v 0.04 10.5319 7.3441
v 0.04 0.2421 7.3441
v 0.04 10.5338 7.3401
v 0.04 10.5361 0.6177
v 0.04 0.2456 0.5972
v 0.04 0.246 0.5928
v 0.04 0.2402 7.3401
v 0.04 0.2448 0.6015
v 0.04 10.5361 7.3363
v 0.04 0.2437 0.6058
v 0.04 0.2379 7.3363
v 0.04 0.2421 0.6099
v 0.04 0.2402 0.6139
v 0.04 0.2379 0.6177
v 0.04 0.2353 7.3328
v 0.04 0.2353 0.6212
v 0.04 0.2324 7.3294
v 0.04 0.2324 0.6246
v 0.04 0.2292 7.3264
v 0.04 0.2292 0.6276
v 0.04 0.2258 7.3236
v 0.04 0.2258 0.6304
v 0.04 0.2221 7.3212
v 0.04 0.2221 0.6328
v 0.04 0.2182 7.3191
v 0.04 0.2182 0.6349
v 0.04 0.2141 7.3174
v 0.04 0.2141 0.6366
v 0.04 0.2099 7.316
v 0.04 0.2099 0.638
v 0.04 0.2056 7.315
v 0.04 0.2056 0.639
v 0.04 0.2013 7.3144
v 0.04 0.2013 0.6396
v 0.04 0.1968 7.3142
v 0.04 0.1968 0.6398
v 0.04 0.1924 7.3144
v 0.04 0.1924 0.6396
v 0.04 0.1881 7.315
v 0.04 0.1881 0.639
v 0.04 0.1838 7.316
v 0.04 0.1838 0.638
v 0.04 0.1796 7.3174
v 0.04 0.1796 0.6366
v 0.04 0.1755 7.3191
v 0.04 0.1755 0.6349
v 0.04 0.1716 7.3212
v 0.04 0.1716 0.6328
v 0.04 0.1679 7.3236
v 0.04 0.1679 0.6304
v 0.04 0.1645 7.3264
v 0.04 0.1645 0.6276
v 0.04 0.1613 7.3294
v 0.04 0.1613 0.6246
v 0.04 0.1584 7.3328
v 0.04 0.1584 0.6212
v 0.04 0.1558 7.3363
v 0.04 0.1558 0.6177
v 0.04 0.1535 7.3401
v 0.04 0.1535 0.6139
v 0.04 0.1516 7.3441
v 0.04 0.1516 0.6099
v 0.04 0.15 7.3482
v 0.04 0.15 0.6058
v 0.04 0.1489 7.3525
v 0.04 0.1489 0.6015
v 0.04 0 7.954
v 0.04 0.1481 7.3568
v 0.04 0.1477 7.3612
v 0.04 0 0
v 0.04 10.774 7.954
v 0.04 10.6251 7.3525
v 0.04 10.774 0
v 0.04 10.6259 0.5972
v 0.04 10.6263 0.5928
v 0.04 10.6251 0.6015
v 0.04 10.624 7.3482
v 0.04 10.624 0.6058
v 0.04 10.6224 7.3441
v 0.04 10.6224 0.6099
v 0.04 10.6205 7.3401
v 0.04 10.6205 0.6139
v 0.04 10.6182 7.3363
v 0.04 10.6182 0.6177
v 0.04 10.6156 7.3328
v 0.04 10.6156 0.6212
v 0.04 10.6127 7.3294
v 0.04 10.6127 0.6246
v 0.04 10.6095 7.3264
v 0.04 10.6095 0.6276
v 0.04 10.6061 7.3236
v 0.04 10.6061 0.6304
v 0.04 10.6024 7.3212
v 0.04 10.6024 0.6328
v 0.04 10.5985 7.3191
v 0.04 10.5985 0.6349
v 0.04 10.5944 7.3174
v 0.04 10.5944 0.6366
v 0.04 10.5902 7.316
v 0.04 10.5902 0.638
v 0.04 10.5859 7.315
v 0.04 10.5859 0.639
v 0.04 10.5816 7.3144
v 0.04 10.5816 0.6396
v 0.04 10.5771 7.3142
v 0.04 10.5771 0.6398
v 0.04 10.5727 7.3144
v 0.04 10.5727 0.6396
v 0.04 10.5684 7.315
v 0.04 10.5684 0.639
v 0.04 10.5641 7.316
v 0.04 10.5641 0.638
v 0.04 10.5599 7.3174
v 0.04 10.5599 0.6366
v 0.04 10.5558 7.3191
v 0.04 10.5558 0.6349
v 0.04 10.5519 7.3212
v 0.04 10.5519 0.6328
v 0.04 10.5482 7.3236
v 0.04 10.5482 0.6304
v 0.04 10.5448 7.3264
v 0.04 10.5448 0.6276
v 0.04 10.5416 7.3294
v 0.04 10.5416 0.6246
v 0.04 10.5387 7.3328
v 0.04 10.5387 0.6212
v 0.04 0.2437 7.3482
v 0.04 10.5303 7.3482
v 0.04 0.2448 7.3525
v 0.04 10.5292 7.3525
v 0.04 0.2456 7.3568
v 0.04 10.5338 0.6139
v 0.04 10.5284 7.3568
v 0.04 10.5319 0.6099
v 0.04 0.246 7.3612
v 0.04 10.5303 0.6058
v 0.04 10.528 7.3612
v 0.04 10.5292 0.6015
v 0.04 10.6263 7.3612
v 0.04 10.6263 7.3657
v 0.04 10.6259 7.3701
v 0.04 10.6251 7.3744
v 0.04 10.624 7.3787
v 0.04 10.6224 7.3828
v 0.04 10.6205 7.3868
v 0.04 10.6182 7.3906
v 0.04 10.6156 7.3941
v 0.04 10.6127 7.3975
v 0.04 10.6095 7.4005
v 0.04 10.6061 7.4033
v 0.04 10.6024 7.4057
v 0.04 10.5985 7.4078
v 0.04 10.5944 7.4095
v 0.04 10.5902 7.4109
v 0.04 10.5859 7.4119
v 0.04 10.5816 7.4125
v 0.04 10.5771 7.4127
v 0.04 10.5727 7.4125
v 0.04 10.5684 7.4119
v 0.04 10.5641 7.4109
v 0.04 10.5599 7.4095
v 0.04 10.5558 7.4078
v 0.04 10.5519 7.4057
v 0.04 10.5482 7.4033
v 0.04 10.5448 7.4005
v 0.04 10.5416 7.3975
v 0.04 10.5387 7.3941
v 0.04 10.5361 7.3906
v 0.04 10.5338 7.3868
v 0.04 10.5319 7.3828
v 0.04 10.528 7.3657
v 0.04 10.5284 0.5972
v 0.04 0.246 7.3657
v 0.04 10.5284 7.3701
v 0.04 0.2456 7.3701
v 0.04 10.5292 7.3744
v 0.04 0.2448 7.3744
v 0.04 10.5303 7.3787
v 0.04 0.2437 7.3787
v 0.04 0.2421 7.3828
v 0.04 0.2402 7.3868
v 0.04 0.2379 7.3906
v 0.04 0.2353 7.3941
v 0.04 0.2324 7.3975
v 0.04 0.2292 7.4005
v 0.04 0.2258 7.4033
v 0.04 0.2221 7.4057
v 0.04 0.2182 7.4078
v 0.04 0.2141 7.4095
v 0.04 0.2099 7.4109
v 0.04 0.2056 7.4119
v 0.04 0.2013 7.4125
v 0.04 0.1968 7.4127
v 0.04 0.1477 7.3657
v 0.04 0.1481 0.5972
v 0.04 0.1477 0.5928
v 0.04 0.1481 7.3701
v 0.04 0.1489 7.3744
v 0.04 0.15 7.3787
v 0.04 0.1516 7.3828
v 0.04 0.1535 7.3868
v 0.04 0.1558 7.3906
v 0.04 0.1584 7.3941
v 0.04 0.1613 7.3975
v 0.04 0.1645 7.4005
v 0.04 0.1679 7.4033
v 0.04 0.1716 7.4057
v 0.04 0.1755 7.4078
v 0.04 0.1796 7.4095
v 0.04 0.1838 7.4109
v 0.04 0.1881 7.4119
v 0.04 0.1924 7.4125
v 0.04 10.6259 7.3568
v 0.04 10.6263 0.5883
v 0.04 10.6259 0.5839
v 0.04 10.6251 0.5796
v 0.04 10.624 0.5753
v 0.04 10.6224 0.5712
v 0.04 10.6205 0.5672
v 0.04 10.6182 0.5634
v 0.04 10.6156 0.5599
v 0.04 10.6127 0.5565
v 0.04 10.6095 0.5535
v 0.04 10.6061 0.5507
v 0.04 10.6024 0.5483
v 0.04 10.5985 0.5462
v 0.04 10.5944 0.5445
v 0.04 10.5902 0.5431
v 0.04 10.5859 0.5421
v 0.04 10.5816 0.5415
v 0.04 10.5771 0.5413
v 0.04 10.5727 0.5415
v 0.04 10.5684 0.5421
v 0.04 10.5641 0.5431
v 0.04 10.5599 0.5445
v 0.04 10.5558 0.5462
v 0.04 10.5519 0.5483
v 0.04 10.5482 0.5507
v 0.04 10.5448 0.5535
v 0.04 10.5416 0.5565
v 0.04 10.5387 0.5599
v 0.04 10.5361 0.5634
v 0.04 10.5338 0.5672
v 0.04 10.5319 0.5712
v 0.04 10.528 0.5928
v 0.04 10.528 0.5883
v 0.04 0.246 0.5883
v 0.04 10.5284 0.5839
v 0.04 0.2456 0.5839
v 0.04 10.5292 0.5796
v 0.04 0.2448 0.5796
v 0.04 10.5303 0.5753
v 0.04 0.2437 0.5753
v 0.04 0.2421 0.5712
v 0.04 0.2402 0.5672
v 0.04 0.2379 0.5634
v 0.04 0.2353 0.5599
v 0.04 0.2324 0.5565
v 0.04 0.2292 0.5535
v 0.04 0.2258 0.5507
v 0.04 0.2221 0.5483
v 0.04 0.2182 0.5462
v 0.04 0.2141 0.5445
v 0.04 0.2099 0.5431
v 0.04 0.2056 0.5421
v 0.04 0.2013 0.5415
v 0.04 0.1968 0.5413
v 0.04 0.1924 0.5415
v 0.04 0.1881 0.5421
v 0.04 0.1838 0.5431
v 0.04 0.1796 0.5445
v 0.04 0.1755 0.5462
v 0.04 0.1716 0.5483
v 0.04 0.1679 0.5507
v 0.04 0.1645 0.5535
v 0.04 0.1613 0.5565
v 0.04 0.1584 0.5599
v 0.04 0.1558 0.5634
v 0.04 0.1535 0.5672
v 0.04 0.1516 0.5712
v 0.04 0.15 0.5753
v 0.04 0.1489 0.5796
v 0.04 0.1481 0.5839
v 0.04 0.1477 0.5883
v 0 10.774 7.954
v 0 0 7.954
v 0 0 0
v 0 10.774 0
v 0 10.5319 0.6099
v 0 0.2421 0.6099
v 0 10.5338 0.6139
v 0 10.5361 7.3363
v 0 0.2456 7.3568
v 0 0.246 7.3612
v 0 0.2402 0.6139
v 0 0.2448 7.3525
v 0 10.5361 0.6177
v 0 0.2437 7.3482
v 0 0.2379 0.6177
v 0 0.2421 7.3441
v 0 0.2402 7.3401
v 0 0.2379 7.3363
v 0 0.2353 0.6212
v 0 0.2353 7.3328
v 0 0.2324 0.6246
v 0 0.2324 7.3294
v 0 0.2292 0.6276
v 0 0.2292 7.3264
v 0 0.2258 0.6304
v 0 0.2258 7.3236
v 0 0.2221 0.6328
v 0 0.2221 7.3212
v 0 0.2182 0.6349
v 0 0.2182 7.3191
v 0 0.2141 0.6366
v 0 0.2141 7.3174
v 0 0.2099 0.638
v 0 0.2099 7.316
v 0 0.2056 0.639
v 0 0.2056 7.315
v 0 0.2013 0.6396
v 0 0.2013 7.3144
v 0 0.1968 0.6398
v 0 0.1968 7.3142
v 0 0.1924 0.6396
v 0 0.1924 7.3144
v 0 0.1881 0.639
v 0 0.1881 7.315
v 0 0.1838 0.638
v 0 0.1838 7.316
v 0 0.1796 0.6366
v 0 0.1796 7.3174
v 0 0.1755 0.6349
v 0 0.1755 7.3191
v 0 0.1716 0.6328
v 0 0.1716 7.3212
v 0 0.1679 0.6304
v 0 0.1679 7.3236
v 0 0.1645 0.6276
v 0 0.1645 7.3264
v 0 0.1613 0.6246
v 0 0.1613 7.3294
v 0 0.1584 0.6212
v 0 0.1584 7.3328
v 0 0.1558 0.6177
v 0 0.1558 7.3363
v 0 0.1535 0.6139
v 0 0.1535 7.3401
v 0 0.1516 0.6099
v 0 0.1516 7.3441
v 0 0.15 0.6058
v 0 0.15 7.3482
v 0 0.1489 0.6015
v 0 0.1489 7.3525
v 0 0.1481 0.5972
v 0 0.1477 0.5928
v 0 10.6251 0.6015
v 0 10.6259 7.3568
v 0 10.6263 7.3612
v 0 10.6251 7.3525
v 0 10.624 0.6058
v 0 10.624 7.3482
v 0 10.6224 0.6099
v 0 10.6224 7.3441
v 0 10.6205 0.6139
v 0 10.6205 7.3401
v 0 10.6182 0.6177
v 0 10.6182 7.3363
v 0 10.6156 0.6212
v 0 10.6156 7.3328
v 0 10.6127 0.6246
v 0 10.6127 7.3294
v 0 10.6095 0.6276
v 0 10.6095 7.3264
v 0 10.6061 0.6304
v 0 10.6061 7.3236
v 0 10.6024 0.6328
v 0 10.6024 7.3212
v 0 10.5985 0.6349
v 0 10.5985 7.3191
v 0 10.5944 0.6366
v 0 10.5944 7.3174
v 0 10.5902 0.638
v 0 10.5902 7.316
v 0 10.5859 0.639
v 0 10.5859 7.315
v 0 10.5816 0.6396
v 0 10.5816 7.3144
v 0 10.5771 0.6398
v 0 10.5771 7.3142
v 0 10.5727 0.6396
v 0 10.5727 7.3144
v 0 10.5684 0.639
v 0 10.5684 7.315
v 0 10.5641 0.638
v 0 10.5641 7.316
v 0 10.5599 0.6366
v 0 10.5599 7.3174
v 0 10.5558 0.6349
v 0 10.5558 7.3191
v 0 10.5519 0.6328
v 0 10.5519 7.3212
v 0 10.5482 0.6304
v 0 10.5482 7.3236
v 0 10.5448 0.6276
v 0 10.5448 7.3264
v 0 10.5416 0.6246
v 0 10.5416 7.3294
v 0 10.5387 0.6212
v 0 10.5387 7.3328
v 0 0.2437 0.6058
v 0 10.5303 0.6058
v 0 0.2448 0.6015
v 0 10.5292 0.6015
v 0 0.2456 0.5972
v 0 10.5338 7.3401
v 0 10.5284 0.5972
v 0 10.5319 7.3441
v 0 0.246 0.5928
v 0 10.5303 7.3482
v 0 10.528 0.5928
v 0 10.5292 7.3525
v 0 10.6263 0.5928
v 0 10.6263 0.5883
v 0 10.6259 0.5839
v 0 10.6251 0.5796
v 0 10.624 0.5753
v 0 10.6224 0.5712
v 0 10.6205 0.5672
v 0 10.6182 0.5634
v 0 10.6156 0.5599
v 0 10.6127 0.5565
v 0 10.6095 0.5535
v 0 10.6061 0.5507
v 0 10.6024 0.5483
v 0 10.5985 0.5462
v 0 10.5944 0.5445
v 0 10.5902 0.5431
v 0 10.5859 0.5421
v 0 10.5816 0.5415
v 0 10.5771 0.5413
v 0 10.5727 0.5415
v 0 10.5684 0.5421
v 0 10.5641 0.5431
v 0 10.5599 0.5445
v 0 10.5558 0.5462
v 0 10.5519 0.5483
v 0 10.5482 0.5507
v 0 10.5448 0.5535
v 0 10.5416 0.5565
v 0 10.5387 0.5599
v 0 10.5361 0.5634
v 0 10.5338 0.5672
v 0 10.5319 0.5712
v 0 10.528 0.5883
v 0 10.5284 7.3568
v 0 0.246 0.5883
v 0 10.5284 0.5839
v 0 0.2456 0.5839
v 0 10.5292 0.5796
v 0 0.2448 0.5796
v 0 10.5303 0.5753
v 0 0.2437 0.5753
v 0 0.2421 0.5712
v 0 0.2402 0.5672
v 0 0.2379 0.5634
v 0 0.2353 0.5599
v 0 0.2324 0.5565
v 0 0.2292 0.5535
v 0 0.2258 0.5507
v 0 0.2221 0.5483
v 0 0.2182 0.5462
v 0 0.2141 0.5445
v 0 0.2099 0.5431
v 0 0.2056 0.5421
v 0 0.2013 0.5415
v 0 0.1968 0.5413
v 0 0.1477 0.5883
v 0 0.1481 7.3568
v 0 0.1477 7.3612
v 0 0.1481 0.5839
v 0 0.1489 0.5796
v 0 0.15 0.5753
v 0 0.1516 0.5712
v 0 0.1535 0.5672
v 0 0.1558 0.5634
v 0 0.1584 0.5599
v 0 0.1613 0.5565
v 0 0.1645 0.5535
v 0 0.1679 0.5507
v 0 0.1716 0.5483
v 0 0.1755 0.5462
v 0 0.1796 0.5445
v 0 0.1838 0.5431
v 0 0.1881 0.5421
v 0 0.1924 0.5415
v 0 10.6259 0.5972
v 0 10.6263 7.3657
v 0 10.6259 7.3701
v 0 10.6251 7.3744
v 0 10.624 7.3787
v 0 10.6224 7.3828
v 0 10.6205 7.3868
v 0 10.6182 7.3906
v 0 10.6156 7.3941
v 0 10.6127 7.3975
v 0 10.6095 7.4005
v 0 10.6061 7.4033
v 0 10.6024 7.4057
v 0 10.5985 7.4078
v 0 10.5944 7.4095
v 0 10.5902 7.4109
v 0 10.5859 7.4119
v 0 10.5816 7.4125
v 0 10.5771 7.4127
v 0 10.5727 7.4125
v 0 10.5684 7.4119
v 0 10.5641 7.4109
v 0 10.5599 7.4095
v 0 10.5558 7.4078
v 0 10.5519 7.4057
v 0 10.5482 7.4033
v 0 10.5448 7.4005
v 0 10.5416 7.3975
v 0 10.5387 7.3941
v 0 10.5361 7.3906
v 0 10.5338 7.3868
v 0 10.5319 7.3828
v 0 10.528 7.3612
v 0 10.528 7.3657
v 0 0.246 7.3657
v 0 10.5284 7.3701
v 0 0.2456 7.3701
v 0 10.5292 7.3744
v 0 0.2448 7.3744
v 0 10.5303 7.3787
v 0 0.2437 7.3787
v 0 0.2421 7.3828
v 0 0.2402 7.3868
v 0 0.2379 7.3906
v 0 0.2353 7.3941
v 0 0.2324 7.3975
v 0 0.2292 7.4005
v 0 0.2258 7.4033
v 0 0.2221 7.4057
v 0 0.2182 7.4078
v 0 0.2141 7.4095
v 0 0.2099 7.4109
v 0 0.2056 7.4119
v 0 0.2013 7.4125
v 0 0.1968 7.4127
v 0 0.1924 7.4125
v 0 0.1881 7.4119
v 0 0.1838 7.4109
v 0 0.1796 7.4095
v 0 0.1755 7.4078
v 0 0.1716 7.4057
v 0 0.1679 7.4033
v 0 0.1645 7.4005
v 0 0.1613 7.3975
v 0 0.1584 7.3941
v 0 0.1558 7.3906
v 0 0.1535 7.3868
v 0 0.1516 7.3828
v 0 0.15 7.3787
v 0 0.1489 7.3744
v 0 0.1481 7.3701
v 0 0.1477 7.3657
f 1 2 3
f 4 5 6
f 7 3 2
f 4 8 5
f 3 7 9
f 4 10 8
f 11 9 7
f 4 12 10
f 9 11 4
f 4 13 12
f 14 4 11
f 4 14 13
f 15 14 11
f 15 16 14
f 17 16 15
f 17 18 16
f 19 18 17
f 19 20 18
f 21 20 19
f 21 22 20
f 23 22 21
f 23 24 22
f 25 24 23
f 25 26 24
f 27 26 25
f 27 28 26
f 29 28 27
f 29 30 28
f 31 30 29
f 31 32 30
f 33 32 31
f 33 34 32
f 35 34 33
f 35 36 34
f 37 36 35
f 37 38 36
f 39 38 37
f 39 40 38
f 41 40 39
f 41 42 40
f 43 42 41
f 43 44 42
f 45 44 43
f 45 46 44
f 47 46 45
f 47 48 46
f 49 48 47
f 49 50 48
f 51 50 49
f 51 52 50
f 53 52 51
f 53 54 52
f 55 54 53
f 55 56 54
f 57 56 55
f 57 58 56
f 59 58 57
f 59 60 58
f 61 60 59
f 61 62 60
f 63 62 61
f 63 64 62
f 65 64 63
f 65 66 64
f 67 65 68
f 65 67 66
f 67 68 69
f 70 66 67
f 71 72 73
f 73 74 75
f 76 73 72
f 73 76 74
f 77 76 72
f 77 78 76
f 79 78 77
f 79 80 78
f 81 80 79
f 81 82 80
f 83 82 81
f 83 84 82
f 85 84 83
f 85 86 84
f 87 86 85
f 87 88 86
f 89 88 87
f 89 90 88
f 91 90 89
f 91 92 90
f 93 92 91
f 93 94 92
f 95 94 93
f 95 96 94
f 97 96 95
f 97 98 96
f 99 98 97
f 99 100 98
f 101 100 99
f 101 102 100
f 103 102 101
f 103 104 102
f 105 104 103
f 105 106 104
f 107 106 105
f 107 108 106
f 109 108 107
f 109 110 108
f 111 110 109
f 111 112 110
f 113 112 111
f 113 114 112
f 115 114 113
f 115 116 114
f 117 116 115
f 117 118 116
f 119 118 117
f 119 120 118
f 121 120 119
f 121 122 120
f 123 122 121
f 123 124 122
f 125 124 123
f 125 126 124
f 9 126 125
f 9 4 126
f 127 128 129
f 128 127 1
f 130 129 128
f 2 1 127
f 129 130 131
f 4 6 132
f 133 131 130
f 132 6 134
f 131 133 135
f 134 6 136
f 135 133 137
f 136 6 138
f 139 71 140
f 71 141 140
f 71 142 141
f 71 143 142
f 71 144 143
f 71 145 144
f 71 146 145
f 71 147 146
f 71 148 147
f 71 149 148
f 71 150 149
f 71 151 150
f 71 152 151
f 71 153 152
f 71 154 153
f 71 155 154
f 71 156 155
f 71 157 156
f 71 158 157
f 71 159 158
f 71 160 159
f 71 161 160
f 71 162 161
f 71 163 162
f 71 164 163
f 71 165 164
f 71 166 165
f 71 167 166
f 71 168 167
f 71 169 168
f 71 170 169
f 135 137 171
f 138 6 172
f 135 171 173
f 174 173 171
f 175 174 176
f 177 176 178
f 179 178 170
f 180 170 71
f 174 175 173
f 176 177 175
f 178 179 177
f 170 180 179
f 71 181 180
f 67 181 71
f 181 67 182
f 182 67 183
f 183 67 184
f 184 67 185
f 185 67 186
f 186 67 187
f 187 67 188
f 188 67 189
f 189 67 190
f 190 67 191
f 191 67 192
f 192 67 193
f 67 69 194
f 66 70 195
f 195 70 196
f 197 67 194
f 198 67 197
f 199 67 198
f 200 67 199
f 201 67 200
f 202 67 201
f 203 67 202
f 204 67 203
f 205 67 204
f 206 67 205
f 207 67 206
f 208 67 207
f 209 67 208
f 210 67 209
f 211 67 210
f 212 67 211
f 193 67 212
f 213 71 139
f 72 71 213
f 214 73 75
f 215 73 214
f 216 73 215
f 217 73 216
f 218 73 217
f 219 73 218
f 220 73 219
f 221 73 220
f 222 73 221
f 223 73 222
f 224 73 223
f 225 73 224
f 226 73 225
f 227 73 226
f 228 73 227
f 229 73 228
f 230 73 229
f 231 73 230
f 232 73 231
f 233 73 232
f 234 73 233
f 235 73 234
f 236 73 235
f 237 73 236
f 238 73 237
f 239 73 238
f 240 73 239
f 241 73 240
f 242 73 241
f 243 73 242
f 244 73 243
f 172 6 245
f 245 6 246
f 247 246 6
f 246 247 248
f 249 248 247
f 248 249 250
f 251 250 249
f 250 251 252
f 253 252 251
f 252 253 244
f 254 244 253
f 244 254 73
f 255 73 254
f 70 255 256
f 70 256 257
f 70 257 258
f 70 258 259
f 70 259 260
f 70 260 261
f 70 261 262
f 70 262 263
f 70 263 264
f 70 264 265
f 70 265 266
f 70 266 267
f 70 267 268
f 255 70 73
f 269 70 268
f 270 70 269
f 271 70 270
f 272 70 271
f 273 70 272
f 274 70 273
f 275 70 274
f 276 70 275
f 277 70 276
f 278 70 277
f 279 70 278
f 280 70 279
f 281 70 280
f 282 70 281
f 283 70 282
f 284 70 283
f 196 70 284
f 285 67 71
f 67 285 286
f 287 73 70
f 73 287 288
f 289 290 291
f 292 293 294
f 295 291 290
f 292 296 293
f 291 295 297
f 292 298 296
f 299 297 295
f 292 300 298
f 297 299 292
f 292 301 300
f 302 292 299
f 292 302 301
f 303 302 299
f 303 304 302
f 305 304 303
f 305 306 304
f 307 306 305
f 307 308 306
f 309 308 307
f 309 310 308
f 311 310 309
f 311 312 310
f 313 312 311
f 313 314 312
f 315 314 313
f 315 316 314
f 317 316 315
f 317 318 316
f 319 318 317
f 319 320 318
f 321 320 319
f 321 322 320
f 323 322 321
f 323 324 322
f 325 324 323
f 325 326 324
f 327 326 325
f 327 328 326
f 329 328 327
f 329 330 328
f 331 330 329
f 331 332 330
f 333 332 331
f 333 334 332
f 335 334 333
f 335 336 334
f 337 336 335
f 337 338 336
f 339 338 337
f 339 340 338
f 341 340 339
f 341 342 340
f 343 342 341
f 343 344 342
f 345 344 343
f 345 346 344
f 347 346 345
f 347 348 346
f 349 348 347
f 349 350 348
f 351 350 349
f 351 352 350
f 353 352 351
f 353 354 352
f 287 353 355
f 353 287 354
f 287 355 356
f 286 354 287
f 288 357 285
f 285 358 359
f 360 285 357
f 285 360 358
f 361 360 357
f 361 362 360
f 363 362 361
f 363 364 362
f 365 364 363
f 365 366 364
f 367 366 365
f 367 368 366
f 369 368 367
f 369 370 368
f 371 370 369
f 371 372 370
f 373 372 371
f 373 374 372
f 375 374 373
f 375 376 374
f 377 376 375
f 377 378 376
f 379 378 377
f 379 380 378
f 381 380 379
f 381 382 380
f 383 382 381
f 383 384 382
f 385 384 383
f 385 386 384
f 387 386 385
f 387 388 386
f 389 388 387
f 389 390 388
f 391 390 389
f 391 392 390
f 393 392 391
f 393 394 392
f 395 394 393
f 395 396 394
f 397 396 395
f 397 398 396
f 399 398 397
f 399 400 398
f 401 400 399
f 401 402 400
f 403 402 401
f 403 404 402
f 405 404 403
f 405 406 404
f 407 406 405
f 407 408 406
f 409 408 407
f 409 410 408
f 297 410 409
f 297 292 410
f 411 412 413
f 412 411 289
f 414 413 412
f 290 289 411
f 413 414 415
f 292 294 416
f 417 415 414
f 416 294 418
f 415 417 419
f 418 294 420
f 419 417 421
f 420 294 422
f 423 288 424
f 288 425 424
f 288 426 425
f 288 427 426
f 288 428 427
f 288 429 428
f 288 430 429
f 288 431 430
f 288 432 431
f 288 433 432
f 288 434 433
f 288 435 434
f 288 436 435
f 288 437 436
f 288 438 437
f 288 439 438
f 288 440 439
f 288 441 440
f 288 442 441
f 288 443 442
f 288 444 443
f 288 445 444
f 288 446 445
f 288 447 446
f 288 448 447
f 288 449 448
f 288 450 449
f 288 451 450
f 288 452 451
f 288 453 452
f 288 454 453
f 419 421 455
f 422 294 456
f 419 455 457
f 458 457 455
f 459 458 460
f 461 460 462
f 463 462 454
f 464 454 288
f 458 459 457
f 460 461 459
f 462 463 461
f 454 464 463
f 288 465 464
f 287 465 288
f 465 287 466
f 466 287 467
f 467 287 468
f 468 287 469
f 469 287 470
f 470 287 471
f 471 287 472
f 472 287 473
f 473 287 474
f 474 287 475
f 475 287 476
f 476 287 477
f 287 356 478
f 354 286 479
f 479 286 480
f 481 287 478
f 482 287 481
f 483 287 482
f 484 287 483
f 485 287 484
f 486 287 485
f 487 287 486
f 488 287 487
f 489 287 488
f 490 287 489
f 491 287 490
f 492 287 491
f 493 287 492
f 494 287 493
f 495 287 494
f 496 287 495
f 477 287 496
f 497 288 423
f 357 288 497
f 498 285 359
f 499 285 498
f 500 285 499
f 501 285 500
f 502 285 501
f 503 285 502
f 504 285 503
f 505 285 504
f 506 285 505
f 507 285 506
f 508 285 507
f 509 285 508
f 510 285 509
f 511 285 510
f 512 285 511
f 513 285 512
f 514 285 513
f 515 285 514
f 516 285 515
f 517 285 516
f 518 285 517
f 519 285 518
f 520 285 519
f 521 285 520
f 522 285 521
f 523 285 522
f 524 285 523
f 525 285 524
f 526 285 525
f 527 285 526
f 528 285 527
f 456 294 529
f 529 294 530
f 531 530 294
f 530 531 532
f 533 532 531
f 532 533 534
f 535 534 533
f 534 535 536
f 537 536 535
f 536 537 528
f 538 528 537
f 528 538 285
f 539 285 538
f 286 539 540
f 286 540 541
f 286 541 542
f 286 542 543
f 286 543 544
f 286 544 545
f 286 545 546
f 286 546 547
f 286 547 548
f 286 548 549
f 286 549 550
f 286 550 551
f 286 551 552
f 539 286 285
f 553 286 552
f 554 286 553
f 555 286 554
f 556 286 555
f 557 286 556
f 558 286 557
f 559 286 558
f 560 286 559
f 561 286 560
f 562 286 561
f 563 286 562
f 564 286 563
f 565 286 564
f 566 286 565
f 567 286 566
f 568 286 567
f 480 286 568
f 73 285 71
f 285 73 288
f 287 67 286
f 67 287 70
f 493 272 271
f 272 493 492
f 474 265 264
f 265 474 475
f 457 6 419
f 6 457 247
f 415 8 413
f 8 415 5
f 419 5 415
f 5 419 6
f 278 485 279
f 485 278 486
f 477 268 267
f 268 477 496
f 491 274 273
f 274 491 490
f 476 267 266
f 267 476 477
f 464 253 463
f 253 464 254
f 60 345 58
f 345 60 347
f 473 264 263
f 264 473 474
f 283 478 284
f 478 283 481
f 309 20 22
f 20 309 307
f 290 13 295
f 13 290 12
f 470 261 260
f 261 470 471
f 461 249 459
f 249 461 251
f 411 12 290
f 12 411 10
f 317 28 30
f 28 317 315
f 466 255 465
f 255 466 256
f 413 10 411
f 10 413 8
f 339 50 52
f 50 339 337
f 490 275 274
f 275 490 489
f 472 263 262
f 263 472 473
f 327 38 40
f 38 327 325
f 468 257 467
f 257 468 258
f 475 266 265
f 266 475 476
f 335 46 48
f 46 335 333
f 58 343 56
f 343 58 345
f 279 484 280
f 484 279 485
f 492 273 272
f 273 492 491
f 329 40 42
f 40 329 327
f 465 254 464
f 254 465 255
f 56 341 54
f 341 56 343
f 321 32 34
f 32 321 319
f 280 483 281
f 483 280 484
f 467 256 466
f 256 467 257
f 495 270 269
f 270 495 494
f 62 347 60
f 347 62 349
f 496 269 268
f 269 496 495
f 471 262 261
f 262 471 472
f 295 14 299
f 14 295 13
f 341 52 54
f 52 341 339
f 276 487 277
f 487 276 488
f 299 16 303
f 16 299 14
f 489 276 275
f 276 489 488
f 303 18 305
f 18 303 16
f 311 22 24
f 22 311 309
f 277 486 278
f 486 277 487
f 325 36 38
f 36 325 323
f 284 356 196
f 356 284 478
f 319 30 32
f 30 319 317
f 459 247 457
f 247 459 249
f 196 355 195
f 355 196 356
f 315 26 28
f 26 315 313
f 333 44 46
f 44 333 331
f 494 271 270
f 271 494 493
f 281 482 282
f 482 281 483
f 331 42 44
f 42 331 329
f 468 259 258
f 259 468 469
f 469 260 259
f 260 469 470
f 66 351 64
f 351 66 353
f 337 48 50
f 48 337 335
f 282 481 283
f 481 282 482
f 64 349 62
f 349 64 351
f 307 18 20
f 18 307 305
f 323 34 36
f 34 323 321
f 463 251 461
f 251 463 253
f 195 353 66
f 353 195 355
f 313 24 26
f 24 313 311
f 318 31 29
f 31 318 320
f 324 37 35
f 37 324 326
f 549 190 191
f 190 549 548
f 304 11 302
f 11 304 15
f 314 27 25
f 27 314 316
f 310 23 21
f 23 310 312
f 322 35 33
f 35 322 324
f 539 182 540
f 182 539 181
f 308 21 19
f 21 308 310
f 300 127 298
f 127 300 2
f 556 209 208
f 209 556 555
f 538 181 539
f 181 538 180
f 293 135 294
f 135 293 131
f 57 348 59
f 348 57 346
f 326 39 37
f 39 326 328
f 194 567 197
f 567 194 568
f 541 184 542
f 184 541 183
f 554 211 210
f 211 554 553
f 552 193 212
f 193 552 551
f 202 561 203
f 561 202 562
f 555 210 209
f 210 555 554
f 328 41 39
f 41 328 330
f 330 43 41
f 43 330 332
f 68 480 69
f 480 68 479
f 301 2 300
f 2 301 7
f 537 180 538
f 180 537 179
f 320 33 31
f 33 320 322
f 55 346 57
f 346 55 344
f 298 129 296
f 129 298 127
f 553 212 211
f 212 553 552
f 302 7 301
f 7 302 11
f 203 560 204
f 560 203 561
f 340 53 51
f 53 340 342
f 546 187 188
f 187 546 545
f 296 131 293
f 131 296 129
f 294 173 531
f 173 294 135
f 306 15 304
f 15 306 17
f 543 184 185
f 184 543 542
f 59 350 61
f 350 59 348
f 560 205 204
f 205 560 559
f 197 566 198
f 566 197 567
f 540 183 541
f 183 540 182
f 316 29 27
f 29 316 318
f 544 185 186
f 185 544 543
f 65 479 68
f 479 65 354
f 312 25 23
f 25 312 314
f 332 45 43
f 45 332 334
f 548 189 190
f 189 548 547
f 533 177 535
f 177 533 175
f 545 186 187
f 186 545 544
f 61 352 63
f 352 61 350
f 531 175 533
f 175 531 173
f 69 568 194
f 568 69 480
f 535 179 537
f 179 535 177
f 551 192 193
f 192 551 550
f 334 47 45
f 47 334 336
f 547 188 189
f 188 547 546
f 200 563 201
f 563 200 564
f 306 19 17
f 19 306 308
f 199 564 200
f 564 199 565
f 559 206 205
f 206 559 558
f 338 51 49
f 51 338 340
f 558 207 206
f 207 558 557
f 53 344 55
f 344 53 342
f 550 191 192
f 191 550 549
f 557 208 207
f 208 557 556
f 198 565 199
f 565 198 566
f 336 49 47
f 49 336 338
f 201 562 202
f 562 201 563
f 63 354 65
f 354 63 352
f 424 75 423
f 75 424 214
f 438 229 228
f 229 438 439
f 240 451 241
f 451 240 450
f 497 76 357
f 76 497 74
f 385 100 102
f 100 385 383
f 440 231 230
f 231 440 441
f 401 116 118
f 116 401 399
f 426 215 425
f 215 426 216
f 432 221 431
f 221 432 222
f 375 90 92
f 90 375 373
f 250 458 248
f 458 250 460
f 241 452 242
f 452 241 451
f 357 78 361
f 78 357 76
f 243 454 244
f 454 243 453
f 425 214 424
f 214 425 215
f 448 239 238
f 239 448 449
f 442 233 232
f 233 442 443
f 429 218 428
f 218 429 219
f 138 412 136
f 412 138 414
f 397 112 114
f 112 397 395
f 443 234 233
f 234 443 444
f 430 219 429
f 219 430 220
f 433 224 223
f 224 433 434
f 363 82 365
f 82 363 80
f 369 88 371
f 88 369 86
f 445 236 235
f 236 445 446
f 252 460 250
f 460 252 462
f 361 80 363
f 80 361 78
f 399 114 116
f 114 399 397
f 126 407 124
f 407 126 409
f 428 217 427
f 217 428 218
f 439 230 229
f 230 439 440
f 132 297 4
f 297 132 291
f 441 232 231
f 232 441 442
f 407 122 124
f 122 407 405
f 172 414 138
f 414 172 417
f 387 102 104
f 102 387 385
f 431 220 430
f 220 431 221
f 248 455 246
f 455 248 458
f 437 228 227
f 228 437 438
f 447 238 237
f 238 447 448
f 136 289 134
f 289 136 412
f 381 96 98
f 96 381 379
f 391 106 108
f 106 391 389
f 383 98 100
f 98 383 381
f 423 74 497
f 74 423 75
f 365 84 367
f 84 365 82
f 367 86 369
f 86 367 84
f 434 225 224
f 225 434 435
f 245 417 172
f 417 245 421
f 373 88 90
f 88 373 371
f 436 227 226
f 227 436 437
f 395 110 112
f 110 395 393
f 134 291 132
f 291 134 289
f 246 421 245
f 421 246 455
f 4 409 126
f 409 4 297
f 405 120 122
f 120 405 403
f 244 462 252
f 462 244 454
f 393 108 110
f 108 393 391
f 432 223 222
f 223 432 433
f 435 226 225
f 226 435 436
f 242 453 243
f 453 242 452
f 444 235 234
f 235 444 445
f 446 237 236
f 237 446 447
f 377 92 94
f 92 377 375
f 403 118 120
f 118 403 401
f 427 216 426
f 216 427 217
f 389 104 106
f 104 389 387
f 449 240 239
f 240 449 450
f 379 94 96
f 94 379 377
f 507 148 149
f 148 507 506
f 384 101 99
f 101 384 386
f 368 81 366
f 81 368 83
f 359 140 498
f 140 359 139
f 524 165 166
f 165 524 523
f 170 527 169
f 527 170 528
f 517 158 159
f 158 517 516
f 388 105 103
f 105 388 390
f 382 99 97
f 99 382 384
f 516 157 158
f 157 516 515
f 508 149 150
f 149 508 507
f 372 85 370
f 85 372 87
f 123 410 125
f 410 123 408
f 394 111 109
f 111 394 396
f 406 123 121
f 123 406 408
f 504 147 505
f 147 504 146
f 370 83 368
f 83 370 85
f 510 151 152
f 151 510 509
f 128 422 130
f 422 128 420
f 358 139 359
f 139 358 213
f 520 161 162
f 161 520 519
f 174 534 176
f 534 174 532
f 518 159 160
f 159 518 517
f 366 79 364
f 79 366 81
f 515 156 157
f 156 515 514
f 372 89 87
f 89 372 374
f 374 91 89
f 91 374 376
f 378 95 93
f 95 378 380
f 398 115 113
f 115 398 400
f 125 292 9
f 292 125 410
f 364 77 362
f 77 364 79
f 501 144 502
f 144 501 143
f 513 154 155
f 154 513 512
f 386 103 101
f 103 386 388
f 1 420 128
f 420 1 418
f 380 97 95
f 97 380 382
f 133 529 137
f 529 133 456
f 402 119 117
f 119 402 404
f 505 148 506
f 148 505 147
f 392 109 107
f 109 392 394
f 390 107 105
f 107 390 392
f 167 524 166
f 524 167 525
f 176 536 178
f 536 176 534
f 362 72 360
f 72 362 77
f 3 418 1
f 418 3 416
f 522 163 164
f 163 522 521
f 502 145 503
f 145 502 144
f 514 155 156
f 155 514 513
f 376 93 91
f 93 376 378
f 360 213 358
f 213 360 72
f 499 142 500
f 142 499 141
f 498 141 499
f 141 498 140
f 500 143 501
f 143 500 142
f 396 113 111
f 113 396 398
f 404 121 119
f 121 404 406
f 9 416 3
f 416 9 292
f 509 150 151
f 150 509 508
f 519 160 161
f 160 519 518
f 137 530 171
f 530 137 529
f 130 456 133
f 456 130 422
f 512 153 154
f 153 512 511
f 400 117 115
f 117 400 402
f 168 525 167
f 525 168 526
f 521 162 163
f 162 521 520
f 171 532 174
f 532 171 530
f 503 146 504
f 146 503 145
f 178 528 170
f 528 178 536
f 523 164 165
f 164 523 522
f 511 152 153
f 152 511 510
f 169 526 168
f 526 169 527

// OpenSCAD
module panel(w,h,t) {
    cube([t,w,h]);
}

module drill(x,y,d) {
    translate([0,x,y]) {
        rotate([0,90,0]) {
            cylinder($fn=70,h=4,r1=d/2,
                r2=d/2,center=true);
        }
    }
}

module cutout(x0,y0,w,h) {
    translate([-2,x0,y0]){
        cube([4,w,h]);
    }
}

mm = 0.0393701;



w=10.774;
h=7.954;
t=0.04;

difference(){
    panel(w,h,t);
    
    
    drill(5*mm,15*mm,2.5*mm);
    drill(5*mm,h-15*mm,2.5*mm);
    drill(w-5*mm,15*mm,2.5*mm);
    drill(w-5*mm,h-15*mm,2.5*mm);
    
    
    
}
